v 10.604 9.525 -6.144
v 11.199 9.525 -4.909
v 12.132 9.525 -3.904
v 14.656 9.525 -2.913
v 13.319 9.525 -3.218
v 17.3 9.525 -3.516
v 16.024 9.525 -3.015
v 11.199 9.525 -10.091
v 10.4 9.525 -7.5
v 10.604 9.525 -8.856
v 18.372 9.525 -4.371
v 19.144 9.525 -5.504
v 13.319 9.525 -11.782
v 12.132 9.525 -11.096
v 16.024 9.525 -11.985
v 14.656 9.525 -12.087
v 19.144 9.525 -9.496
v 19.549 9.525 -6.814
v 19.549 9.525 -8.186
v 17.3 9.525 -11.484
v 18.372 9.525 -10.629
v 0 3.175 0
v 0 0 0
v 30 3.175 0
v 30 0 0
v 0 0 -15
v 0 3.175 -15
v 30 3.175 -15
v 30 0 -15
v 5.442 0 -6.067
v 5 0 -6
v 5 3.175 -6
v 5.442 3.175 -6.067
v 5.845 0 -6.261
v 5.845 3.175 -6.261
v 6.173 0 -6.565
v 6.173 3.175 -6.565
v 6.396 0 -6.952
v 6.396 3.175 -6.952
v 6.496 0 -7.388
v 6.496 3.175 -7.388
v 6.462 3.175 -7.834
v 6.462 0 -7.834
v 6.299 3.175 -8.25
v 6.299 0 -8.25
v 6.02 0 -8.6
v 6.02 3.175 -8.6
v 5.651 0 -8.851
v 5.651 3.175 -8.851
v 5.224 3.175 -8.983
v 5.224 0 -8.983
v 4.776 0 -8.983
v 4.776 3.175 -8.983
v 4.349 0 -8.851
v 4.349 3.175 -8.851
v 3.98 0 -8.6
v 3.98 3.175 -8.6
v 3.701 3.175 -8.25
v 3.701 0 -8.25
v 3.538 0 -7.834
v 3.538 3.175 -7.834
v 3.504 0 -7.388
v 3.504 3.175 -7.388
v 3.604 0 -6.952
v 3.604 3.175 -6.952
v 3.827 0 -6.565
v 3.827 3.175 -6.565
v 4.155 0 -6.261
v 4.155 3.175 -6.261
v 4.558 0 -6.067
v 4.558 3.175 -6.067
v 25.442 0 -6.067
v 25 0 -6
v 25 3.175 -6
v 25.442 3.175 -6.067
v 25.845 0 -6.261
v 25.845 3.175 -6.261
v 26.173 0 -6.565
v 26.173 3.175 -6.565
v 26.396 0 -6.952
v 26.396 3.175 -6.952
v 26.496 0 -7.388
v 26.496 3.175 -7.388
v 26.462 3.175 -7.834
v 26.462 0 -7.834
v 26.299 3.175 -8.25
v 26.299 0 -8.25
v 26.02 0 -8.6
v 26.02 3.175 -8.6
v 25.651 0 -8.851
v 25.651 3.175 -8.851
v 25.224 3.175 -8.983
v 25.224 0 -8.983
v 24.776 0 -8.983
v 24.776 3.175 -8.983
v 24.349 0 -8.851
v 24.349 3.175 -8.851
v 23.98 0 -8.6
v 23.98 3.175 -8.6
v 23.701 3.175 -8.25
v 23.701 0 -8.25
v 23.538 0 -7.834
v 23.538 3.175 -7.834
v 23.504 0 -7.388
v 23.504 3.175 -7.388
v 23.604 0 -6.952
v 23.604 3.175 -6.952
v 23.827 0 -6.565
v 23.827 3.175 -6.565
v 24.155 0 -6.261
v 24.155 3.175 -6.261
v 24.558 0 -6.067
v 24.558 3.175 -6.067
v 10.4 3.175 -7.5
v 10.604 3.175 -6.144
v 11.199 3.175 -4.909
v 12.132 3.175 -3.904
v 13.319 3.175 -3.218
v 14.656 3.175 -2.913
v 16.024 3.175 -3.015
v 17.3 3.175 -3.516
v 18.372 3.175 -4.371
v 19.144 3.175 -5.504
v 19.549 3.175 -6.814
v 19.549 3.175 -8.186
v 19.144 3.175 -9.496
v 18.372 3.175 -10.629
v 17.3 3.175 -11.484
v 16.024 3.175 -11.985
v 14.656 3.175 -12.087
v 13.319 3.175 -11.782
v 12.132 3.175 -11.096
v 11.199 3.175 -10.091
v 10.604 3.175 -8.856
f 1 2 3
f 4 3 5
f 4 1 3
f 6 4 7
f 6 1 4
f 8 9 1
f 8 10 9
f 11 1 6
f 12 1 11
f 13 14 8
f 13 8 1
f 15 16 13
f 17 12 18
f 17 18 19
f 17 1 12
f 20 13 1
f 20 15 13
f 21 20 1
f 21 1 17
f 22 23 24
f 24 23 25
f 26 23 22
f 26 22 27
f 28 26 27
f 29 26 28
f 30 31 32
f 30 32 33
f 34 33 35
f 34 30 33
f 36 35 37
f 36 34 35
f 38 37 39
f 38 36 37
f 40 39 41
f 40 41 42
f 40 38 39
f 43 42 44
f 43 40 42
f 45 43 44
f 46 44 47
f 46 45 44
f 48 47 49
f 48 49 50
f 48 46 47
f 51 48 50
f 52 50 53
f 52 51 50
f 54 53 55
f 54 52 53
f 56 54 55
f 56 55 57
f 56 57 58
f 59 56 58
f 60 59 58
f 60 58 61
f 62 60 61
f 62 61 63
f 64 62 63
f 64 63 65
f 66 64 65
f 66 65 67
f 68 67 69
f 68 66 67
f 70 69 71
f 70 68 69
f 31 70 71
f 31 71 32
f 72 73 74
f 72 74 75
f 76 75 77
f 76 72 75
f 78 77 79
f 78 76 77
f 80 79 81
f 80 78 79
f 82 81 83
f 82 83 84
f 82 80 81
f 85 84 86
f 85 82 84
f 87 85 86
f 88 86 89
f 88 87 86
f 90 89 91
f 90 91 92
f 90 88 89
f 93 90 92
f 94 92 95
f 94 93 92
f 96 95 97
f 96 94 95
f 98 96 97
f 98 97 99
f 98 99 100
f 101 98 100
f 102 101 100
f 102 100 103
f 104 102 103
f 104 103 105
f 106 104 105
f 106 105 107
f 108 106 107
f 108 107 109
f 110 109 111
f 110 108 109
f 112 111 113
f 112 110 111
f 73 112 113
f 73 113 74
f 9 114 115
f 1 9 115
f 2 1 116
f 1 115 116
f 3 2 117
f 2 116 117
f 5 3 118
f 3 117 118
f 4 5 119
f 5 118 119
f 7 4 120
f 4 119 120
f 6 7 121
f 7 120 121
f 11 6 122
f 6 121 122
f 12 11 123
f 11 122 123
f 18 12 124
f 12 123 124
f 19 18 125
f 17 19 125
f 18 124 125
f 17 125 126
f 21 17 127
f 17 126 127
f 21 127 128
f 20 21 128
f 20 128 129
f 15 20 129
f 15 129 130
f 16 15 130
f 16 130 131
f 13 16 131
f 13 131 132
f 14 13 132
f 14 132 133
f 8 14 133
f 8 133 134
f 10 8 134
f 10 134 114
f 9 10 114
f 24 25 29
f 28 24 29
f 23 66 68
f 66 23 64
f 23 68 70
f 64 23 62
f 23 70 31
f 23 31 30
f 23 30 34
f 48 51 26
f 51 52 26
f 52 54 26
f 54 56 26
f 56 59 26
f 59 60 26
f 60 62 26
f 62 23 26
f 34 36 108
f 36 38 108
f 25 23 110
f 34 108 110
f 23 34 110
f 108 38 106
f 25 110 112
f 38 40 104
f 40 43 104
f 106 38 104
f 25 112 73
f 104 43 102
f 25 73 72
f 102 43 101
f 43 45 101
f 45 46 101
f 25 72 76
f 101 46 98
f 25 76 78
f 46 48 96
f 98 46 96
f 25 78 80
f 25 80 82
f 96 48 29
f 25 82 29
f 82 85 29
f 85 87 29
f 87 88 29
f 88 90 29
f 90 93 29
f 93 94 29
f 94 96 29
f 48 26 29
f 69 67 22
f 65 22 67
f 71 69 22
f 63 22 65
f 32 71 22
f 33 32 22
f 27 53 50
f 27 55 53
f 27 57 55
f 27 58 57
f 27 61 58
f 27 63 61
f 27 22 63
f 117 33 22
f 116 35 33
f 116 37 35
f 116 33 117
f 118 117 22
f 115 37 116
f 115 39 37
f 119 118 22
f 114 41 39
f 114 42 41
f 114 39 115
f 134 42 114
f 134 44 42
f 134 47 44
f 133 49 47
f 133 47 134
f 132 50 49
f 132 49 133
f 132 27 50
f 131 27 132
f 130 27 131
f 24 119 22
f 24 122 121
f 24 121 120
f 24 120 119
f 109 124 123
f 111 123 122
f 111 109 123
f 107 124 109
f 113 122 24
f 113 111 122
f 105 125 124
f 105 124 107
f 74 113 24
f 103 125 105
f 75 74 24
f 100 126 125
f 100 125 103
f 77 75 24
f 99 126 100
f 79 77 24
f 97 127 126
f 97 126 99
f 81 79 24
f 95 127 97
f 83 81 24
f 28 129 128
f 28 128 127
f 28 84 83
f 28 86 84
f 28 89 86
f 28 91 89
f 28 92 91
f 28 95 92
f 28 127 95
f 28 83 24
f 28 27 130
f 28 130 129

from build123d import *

# Parameters (mm, degrees)
SKETCH1_R           = 4.6
BOSS_EXTRUDE1_DEPTH = 9.525
SKETCH1_3_W         = 30
SKETCH1_3_H         = 15
SKETCH1_3_R         = 1.5
BOSS_EXTRUDE2_DEPTH = 3.175


with BuildPart() as part:
    # Sketch1 → Boss-Extrude1 (new body)
    with BuildSketch(Plane(origin=(0, 0, 0), x_dir=(1, 0, 0), z_dir=(0, 1, 0))):
        with Locations((15, 7.5)):
            Circle(SKETCH1_R)
    extrude(amount=BOSS_EXTRUDE1_DEPTH)

    # Sketch1<3> → Boss-Extrude2 (add)
    with BuildSketch(Plane(origin=(0, 0, 0), x_dir=(1, 0, 0), z_dir=(0, 1, 0))):
        with Locations((15, 7.5)):
            Rectangle(SKETCH1_3_W, SKETCH1_3_H)
        with Locations((5, 7.5)):
            Circle(SKETCH1_3_R, mode=Mode.SUBTRACT)
        with BuildLine():
            ThreePointArc((10.4, 7.5), (15, 12.1), (19.6, 7.5))
            ThreePointArc((19.6, 7.5), (15, 2.9), (10.4, 7.5))
        make_face(mode=Mode.SUBTRACT)
        with BuildLine():
            ThreePointArc((26.5, 7.5), (25, 6), (23.5, 7.5))
            ThreePointArc((23.5, 7.5), (25, 9), (26.5, 7.5))
        make_face(mode=Mode.SUBTRACT)
    extrude(amount=BOSS_EXTRUDE2_DEPTH)


solid = part.part
